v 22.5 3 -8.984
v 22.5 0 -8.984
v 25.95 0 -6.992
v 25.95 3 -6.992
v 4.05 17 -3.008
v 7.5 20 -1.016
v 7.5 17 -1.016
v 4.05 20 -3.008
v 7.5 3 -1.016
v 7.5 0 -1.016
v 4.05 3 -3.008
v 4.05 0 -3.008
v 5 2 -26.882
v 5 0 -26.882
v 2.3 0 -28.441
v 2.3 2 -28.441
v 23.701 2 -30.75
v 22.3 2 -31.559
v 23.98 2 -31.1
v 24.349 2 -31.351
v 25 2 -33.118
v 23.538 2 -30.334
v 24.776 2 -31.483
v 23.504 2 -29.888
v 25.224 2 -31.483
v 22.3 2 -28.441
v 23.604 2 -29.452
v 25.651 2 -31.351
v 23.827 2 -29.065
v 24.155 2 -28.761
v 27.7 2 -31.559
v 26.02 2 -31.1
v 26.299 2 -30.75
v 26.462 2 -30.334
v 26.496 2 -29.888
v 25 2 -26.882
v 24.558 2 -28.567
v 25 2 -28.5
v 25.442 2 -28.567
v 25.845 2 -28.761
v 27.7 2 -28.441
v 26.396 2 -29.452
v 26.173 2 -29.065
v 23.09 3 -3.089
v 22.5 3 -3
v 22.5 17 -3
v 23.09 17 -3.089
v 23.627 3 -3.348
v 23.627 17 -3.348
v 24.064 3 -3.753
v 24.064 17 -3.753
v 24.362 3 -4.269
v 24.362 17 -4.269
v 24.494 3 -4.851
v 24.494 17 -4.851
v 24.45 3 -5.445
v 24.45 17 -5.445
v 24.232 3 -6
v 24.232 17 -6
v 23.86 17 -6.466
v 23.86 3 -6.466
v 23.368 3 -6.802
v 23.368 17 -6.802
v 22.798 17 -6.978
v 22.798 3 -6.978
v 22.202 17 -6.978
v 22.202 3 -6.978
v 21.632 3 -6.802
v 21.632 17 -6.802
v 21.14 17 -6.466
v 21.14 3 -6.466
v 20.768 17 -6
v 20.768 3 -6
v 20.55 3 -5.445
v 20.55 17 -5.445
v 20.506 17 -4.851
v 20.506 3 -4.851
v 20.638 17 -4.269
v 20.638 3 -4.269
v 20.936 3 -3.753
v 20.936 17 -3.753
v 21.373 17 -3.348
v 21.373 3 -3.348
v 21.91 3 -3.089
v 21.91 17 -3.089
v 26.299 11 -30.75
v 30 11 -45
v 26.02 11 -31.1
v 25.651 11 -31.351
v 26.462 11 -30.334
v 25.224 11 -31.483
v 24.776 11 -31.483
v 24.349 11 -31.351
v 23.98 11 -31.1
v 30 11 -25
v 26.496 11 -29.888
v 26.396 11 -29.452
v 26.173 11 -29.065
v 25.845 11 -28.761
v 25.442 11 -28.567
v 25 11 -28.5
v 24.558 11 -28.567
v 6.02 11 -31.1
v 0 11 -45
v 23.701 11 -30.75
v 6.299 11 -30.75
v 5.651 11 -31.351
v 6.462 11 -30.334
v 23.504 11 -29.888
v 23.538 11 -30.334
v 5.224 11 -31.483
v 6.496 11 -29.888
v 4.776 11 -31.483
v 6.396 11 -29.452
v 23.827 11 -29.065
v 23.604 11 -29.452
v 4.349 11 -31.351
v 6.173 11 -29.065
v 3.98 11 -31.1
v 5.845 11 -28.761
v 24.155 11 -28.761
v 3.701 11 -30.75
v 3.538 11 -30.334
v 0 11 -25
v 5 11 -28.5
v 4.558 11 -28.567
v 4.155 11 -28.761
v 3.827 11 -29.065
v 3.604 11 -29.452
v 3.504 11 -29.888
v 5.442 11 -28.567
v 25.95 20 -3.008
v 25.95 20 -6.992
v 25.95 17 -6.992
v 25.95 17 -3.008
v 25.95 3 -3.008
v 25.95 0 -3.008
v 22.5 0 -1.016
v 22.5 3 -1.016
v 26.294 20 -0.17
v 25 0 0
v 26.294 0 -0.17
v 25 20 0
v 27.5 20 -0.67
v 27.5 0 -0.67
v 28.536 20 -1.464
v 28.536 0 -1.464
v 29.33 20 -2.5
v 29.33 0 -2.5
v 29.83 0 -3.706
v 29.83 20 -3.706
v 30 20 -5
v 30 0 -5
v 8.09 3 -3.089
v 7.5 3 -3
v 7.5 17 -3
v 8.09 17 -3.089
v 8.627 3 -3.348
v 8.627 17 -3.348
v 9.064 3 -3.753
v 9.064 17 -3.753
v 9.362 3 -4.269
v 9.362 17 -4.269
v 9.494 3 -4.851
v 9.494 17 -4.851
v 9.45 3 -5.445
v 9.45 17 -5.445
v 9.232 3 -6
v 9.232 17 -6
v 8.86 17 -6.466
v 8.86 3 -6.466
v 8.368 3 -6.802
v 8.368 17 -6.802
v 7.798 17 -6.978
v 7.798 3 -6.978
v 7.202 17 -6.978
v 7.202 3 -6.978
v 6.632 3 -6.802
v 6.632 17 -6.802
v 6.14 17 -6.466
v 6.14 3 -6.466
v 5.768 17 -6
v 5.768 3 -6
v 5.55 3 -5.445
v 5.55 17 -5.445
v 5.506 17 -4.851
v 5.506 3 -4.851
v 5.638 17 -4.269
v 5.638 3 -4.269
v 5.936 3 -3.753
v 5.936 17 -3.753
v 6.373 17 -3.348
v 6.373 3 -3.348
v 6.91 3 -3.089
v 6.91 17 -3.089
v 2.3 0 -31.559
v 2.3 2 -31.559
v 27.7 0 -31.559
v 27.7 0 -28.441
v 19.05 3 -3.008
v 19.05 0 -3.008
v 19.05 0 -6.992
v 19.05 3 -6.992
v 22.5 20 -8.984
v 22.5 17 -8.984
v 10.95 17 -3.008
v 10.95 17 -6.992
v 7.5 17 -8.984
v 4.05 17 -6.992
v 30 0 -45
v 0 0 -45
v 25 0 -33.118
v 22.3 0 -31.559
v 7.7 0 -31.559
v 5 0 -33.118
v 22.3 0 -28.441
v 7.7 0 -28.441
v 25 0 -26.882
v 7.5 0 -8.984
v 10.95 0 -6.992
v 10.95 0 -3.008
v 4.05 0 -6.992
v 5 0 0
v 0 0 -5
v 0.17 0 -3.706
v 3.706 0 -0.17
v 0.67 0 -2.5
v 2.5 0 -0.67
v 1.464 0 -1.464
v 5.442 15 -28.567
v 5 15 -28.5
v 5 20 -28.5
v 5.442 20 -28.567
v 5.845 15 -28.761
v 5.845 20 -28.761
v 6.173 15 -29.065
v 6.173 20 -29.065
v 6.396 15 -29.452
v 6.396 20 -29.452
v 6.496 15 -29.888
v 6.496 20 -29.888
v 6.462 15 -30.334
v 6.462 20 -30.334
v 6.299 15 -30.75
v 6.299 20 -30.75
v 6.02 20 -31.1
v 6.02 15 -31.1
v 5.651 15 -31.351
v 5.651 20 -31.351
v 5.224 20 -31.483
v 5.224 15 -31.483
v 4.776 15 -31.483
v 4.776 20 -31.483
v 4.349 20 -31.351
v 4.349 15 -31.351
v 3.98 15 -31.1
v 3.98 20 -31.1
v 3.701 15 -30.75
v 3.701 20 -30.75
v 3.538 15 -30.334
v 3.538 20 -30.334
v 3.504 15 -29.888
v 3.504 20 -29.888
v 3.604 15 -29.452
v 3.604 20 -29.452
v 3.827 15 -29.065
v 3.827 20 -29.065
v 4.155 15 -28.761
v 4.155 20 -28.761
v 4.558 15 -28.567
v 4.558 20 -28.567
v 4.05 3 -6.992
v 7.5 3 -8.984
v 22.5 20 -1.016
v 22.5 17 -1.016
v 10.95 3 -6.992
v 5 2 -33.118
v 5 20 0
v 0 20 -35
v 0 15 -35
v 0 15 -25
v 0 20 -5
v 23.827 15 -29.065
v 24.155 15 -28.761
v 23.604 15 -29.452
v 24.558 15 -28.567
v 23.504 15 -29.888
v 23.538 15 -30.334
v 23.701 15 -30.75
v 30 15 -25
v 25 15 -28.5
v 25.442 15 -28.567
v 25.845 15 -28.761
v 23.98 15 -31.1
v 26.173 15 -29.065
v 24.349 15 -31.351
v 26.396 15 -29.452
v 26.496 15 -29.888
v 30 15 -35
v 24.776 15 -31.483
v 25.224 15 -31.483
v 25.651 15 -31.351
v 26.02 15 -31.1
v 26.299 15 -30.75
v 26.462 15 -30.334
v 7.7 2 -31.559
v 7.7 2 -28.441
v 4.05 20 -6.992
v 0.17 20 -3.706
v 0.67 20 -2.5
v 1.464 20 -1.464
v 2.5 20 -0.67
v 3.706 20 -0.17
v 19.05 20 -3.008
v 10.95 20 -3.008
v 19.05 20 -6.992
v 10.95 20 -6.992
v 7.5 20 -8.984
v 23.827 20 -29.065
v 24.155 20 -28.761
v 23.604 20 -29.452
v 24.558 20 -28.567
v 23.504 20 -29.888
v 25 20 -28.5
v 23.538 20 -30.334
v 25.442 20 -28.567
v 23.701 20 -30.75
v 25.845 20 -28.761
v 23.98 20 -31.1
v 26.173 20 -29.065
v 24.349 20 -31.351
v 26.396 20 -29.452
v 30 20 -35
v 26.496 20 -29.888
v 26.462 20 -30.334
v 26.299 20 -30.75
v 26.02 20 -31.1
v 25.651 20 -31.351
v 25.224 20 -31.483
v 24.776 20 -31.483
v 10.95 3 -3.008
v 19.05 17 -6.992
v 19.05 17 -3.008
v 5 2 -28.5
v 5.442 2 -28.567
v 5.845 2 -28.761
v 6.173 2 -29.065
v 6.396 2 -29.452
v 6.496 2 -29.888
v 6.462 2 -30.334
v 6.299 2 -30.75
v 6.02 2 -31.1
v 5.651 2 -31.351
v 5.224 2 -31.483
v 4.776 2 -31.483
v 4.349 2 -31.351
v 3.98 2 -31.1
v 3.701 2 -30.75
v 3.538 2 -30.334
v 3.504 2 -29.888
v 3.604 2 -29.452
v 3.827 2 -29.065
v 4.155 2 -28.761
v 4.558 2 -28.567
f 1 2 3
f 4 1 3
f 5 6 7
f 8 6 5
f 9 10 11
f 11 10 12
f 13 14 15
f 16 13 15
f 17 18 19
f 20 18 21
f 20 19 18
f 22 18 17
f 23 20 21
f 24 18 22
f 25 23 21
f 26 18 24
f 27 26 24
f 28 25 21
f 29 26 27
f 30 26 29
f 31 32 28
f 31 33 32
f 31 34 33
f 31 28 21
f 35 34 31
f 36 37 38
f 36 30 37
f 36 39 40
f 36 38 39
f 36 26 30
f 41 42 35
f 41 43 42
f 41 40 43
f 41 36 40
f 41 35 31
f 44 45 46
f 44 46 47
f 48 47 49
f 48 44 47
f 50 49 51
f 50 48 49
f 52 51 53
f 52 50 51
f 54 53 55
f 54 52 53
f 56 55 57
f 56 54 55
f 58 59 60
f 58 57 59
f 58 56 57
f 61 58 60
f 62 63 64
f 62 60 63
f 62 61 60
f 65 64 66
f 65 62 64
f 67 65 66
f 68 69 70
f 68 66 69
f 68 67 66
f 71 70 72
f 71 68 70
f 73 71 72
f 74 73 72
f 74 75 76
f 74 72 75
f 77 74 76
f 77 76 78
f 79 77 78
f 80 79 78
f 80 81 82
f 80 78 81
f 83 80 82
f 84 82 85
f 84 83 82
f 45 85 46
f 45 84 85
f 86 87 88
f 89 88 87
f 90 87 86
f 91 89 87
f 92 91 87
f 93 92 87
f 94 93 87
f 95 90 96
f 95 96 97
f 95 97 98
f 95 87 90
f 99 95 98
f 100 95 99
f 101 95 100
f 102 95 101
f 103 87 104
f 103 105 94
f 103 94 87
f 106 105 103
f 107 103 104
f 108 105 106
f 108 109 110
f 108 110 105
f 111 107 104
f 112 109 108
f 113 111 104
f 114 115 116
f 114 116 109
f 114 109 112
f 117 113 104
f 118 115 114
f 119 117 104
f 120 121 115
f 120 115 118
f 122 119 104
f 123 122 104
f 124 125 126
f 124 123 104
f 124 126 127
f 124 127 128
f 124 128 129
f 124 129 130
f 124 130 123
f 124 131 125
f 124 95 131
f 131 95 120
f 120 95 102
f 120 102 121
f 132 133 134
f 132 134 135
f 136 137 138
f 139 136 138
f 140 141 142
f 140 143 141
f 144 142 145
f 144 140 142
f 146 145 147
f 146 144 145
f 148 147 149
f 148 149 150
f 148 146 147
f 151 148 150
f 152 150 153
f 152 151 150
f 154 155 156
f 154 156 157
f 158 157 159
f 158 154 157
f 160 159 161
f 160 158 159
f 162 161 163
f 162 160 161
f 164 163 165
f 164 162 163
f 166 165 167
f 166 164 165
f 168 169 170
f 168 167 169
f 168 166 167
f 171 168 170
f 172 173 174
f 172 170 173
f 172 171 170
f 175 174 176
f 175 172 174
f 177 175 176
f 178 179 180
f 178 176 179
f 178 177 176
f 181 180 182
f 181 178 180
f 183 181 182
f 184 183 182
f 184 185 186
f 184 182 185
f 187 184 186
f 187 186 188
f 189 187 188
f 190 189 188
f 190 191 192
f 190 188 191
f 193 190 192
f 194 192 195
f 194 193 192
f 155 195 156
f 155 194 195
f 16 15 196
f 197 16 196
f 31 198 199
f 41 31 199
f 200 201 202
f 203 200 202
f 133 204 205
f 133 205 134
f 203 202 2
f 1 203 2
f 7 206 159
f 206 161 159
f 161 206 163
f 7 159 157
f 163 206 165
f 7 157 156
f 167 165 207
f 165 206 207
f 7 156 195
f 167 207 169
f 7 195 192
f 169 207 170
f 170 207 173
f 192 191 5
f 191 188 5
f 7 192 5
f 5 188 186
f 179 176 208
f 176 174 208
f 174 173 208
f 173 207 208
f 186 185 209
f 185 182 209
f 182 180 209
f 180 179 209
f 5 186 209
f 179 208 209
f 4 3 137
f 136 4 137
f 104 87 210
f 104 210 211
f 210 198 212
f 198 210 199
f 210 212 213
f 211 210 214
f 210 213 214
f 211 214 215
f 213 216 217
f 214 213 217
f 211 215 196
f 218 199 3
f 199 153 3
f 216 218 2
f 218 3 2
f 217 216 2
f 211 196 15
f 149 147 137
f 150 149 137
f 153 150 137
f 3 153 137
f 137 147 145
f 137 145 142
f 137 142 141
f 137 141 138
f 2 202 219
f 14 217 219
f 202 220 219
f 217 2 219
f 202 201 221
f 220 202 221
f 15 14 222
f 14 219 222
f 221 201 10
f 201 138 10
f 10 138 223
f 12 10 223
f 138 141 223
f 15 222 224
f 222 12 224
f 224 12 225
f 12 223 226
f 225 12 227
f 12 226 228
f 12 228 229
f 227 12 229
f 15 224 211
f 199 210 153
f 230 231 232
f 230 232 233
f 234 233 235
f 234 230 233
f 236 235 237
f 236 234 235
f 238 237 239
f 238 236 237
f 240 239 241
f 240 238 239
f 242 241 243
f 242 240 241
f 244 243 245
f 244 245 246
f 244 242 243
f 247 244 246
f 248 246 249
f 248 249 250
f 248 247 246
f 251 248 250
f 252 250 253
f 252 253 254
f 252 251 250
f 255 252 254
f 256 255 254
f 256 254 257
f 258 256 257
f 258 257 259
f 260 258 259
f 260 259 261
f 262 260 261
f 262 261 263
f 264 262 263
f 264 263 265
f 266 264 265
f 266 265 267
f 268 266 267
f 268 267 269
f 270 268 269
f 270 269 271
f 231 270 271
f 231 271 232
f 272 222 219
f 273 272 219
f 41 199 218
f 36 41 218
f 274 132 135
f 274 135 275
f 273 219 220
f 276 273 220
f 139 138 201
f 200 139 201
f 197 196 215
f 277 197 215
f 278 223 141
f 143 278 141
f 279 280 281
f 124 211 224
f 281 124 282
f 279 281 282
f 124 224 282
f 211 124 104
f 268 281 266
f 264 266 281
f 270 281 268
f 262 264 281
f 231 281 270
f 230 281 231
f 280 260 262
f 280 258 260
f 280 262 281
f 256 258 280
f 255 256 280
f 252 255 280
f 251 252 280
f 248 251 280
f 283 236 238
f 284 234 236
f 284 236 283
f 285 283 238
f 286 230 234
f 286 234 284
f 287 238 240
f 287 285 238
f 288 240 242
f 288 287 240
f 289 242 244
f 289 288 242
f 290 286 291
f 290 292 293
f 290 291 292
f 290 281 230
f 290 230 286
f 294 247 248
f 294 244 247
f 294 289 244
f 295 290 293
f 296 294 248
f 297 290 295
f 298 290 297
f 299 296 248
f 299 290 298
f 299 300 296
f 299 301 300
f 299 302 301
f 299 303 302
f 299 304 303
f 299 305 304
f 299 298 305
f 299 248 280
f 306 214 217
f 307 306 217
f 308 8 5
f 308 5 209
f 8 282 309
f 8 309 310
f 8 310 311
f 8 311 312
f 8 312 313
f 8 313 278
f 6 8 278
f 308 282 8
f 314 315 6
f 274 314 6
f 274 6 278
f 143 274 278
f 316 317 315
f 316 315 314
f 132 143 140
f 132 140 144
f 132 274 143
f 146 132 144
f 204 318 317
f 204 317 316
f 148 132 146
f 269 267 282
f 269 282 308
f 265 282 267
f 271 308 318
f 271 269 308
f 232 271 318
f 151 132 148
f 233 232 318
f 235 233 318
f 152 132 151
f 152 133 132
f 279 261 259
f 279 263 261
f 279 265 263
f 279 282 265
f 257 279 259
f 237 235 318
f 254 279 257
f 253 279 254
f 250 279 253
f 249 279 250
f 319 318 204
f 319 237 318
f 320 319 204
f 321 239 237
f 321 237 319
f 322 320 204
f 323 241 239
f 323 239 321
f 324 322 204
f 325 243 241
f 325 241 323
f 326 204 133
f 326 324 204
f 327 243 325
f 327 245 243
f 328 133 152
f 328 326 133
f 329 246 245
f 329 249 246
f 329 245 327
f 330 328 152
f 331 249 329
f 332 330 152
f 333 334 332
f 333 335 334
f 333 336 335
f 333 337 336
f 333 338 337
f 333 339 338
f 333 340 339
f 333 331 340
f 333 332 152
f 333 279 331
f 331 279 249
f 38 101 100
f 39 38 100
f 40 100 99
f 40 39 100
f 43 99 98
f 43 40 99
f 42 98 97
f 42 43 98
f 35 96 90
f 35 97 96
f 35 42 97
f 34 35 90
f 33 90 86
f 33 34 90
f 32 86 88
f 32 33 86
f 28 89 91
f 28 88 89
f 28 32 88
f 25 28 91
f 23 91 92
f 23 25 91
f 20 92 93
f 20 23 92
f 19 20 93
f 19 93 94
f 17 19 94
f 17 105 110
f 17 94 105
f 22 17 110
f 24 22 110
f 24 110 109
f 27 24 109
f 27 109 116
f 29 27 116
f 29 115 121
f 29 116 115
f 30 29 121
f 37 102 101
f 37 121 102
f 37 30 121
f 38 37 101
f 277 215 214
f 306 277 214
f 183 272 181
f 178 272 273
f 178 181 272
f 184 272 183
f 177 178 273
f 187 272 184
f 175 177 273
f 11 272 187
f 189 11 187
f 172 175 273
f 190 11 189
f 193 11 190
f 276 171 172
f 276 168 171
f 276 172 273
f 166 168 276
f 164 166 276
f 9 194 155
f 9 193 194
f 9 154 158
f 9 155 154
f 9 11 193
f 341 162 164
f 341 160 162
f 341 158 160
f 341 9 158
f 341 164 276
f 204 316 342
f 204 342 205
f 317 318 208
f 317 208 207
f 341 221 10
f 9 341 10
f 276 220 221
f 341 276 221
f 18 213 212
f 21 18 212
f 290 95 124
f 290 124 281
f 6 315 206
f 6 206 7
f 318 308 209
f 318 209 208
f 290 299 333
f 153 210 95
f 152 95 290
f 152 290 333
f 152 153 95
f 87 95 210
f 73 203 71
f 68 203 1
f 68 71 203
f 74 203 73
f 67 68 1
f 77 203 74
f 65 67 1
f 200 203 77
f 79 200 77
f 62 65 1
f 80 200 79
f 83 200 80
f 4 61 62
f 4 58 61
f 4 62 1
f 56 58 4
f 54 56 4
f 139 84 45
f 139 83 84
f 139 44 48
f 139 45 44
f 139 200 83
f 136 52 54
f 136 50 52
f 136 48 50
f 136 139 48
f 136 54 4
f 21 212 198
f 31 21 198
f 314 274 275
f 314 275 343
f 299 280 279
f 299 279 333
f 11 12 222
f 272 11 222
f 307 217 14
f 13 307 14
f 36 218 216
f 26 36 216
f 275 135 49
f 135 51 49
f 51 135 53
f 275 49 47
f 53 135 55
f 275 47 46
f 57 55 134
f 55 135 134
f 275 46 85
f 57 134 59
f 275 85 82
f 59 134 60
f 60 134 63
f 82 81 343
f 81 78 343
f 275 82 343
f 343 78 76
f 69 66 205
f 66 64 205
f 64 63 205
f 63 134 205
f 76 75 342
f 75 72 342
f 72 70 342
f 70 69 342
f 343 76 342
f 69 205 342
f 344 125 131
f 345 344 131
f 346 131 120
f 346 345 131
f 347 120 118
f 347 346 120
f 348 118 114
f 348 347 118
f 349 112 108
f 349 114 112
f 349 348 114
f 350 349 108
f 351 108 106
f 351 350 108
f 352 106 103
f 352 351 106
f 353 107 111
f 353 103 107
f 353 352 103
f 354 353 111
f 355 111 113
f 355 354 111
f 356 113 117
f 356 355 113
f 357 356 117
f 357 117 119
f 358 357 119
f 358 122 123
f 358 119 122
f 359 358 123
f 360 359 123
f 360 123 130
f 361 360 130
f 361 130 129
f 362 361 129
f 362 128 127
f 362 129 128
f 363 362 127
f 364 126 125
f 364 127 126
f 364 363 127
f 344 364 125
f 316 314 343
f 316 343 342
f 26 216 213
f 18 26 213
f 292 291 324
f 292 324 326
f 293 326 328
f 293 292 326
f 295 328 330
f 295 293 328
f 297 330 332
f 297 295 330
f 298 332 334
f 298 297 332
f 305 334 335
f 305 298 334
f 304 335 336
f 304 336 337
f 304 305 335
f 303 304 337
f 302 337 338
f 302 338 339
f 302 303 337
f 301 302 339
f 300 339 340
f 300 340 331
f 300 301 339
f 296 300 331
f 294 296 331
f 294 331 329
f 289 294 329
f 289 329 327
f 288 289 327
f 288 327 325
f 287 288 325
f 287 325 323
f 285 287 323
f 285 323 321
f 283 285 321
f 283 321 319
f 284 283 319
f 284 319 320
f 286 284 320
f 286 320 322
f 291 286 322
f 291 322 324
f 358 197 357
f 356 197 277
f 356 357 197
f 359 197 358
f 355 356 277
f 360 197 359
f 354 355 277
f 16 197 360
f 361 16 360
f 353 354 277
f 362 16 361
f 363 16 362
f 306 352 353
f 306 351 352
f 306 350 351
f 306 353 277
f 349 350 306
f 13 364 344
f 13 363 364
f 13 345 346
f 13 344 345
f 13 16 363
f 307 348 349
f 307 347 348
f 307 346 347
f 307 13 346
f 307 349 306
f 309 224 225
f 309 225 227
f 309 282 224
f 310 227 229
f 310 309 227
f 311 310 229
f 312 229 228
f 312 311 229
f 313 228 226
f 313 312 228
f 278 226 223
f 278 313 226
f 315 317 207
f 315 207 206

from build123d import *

# Parameters (mm, degrees)
CROQUIS1_W              = 30
CROQUIS1_H              = 35
CROQUIS1_R              = 1.5
CROQUIS1_R_2            = 2
SALIENTE_EXTRUIR1_DEPTH = 20
CROQUIS2_W              = 10
CROQUIS2_H              = 4
CORTAR_EXTRUIR1_DEPTH   = 41
CORTAR_EXTRUIR2_DEPTH   = 2
CORTAR_EXTRUIR3_DEPTH   = 3
CORTAR_EXTRUIR4_DEPTH   = 3
REDONDEO1_R             = 5
CROQUIS6_W              = 30
CROQUIS6_H              = 11
SALIENTE_EXTRUIR2_DEPTH = 10


with BuildPart() as part:
    # Croquis1 → Saliente-Extruir1 (new body)
    with BuildSketch(Plane(origin=(0, 0, 0), x_dir=(1, 0, 0), z_dir=(0, 1, 0))):
        with Locations((15, 17.5)):
            Rectangle(CROQUIS1_W, CROQUIS1_H)
        with Locations(Location((25, 30, 0), (0, 0, 270))):
            Circle(CROQUIS1_R, mode=Mode.SUBTRACT)
        with Locations(Location((5, 30, 0), (0, 0, 270))):
            Circle(CROQUIS1_R, mode=Mode.SUBTRACT)
        with Locations(Location((7.5, 5, 0), (0, 0, 270))):
            Circle(CROQUIS1_R_2, mode=Mode.SUBTRACT)
        with Locations(Location((22.5, 5, 0), (0, 0, 270))):
            Circle(CROQUIS1_R_2, mode=Mode.SUBTRACT)
    extrude(amount=SALIENTE_EXTRUIR1_DEPTH)

    # Croquis2 → Cortar-Extruir1 (cut)
    with BuildSketch(Plane(origin=(30, 0, 0), x_dir=(0, 0, -1), z_dir=(1, 0, 0))):
        with Locations((30, 13)):
            Rectangle(CROQUIS2_W, CROQUIS2_H)
    extrude(amount=-CORTAR_EXTRUIR1_DEPTH, mode=Mode.SUBTRACT)

    # Croquis3 → Cortar-Extruir2 (cut)
    with BuildSketch(Plane.XZ):
        Polygon((5, -33.117691454), (7.7, -31.558845727), (7.7, -28.441154273), (5, -26.882308546), (2.3, -28.441154273), (2.3, -31.558845727), align=None)
        Polygon((25, -33.117691454), (27.7, -31.558845727), (27.7, -28.441154273), (25, -26.882308546), (22.3, -28.441154273), (22.3, -31.558845727), align=None)
    extrude(amount=-CORTAR_EXTRUIR2_DEPTH, mode=Mode.SUBTRACT)

    # Croquis4 → Cortar-Extruir3 (cut)
    with BuildSketch(Plane.XZ):
        Polygon((7.5, -8.983716857), (10.95, -6.991858429), (10.95, -3.008141571), (7.5, -1.016283143), (4.05, -3.008141571), (4.05, -6.991858429), align=None)
        Polygon((22.5, -8.983716857), (25.95, -6.991858429), (25.95, -3.008141571), (22.5, -1.016283143), (19.05, -3.008141571), (19.05, -6.991858429), align=None)
    extrude(amount=-CORTAR_EXTRUIR3_DEPTH, mode=Mode.SUBTRACT)

    # Croquis5 → Cortar-Extruir4 (cut)
    with BuildSketch(Plane(origin=(0, 20, 0), x_dir=(1, 0, 0), z_dir=(0, 1, 0))):
        Polygon((22.5, 1.016283143), (19.05, 3.008141571), (19.05, 6.991858429), (22.5, 8.983716857), (25.95, 6.991858429), (25.95, 3.008141571), align=None)
        Polygon((4.05, 6.991858429), (7.5, 8.983716857), (10.95, 6.991858429), (10.95, 3.008141571), (7.5, 1.016283143), (4.05, 3.008141571), align=None)
    extrude(amount=-CORTAR_EXTRUIR4_DEPTH, mode=Mode.SUBTRACT)

    # Redondeo1
    redondeo1_edges = [part.edges().sort_by_distance(p)[0] for p in [
        (30, 10, 0),
        (0, 10, 0),
    ]]
    fillet(redondeo1_edges, radius=REDONDEO1_R)

    # Croquis6 → Saliente-Extruir2 (add)
    with BuildSketch(Plane(origin=(0, 0, -35), x_dir=(-1, 0, 0), z_dir=(0, 0, -1))):
        with Locations((-15, 5.5)):
            Rectangle(CROQUIS6_W, CROQUIS6_H)
    extrude(amount=SALIENTE_EXTRUIR2_DEPTH)


solid = part.part
